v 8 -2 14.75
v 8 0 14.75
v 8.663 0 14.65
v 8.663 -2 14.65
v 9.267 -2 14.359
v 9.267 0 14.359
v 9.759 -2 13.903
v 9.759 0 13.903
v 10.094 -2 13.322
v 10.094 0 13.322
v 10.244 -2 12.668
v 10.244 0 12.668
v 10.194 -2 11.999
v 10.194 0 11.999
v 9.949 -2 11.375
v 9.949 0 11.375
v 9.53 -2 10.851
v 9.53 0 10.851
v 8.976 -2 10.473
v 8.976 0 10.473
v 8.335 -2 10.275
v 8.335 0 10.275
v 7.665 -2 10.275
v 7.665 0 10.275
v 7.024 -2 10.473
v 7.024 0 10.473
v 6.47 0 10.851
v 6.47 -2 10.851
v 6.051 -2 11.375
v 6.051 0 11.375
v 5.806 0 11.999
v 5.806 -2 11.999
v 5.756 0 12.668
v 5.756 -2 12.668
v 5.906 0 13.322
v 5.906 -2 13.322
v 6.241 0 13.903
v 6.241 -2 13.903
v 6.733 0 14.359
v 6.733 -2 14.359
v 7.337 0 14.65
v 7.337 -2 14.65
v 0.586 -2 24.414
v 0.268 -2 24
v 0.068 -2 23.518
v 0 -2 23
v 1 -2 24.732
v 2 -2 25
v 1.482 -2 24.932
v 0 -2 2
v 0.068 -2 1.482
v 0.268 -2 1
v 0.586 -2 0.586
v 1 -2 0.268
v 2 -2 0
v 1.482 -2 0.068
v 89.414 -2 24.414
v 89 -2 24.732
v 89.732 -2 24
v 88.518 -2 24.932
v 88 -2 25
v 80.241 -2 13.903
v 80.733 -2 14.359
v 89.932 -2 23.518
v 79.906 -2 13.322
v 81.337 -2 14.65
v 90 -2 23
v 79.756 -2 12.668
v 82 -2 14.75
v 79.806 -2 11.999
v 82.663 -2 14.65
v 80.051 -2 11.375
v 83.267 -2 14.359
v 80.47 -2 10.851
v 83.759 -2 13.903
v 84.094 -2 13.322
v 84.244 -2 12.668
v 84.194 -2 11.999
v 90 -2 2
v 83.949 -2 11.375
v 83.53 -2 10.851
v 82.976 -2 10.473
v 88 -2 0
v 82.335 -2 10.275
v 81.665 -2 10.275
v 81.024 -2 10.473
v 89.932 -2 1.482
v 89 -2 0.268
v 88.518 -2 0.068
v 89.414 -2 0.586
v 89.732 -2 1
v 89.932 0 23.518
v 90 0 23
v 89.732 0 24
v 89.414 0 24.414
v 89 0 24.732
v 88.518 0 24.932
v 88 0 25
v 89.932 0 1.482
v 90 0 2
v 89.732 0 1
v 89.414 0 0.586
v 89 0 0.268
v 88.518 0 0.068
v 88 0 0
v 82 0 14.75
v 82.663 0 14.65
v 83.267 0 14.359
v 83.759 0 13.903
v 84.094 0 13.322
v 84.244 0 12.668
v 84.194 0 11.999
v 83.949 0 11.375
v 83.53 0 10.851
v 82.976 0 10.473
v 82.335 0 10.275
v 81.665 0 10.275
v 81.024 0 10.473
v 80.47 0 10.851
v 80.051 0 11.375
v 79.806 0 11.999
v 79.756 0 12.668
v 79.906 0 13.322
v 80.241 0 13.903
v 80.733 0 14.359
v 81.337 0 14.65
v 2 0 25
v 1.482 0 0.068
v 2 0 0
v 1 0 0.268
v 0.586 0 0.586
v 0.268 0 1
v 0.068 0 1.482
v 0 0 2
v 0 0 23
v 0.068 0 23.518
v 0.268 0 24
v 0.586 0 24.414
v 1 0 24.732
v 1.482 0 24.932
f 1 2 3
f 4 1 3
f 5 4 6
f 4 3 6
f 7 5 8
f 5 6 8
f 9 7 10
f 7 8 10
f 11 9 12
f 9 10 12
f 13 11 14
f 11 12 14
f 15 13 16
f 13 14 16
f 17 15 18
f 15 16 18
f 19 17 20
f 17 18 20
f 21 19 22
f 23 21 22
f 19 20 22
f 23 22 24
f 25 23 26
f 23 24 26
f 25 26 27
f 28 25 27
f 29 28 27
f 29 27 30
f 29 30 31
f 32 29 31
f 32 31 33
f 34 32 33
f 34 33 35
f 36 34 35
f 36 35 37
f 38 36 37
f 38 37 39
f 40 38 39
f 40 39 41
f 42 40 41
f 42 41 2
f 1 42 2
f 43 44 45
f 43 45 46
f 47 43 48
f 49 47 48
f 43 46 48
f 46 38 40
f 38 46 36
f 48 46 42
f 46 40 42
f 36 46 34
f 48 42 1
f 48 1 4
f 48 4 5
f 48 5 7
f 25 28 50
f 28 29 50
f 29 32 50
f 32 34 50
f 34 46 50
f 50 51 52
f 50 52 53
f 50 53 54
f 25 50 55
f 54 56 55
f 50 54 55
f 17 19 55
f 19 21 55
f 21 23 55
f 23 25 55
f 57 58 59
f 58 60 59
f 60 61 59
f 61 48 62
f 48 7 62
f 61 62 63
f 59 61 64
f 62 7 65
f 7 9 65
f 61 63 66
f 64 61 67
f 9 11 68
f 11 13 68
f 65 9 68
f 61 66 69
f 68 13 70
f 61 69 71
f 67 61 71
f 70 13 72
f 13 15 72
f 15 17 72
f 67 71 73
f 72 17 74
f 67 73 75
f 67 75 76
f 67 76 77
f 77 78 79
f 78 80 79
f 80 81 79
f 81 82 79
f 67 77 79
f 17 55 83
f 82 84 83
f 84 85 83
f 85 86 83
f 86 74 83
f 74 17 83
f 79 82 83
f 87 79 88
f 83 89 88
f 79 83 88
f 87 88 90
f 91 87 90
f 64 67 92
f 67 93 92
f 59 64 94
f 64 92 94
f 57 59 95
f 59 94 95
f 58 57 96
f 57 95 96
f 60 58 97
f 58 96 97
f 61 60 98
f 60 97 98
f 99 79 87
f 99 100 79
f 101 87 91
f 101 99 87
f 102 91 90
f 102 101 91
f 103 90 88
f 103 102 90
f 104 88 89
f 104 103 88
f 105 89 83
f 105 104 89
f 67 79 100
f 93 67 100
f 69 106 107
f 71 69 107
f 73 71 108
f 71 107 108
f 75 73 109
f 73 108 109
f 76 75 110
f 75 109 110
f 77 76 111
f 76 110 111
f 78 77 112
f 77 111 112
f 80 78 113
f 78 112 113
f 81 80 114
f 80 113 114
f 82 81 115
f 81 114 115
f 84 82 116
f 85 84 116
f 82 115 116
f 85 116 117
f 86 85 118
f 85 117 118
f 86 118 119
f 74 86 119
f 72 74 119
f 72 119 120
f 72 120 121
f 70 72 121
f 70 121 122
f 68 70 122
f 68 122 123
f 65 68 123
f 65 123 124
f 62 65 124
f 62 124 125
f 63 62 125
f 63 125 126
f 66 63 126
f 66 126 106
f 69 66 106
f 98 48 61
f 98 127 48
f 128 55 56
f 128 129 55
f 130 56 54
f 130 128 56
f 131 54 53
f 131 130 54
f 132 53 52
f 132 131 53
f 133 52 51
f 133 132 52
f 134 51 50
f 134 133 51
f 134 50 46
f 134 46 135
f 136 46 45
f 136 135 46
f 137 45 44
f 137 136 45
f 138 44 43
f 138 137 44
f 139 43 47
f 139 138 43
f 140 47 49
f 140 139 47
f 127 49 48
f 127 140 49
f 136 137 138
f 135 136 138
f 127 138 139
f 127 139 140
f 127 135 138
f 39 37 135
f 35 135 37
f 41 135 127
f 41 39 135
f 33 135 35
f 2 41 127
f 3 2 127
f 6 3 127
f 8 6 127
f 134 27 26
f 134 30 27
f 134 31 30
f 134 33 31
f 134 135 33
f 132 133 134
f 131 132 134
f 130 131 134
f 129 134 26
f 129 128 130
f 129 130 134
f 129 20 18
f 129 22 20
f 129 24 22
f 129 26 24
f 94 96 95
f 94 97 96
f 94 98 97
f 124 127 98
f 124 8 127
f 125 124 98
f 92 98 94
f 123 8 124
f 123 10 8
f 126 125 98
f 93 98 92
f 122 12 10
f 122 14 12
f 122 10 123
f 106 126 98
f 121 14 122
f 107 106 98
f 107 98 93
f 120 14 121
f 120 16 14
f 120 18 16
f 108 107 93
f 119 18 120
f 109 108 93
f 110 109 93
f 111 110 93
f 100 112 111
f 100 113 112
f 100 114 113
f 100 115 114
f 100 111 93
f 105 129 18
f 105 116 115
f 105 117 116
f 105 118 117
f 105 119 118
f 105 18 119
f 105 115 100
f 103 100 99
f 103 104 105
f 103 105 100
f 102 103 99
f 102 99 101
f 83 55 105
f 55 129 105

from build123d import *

# Parameters (mm, degrees)
ESQUISSE1_W             = 90
ESQUISSE1_H             = 2
EXTRU_MINCE1_DEPTH      = 25
CONG_1_R                = 2
CONG_2_R                = 2
CONG_3_R                = 2
CONG_4_R                = 2
ESQUISSE2_R             = 2.25
ENL_V_MAT_EXTRU_1_DEPTH = 10


with BuildPart() as part:
    # Esquisse1 → Extru.-Mince1 (new body)
    with BuildSketch(Plane.XY):
        with Locations((45, -1)):
            Rectangle(ESQUISSE1_W, ESQUISSE1_H)
    extrude(amount=EXTRU_MINCE1_DEPTH)

    # Congé1
    cong_1_edges = [part.edges().sort_by_distance(p)[0] for p in [
        (90, -1, 25),
    ]]
    fillet(cong_1_edges, radius=CONG_1_R)

    # Congé2
    cong_2_edges = [part.edges().sort_by_distance(p)[0] for p in [
        (90, -1, 0),
    ]]
    fillet(cong_2_edges, radius=CONG_2_R)

    # Congé3
    cong_3_edges = [part.edges().sort_by_distance(p)[0] for p in [
        (0, -1, 0),
    ]]
    fillet(cong_3_edges, radius=CONG_3_R)

    # Congé4
    cong_4_edges = [part.edges().sort_by_distance(p)[0] for p in [
        (0, -1, 25),
    ]]
    fillet(cong_4_edges, radius=CONG_4_R)

    # Esquisse2 → Enlèv. mat.-Extru.1 (cut)
    with BuildSketch(Plane(origin=(0, 0, 0), x_dir=(1, 0, 0), z_dir=(0, 1, 0))):
        with Locations(Location((82, -12.5, 0), (0, 0, 270))):
            Circle(ESQUISSE2_R)
        with Locations(Location((8, -12.5, 0), (0, 0, 270))):
            Circle(ESQUISSE2_R)
    extrude(amount=-ENL_V_MAT_EXTRU_1_DEPTH, mode=Mode.SUBTRACT)


solid = part.part
